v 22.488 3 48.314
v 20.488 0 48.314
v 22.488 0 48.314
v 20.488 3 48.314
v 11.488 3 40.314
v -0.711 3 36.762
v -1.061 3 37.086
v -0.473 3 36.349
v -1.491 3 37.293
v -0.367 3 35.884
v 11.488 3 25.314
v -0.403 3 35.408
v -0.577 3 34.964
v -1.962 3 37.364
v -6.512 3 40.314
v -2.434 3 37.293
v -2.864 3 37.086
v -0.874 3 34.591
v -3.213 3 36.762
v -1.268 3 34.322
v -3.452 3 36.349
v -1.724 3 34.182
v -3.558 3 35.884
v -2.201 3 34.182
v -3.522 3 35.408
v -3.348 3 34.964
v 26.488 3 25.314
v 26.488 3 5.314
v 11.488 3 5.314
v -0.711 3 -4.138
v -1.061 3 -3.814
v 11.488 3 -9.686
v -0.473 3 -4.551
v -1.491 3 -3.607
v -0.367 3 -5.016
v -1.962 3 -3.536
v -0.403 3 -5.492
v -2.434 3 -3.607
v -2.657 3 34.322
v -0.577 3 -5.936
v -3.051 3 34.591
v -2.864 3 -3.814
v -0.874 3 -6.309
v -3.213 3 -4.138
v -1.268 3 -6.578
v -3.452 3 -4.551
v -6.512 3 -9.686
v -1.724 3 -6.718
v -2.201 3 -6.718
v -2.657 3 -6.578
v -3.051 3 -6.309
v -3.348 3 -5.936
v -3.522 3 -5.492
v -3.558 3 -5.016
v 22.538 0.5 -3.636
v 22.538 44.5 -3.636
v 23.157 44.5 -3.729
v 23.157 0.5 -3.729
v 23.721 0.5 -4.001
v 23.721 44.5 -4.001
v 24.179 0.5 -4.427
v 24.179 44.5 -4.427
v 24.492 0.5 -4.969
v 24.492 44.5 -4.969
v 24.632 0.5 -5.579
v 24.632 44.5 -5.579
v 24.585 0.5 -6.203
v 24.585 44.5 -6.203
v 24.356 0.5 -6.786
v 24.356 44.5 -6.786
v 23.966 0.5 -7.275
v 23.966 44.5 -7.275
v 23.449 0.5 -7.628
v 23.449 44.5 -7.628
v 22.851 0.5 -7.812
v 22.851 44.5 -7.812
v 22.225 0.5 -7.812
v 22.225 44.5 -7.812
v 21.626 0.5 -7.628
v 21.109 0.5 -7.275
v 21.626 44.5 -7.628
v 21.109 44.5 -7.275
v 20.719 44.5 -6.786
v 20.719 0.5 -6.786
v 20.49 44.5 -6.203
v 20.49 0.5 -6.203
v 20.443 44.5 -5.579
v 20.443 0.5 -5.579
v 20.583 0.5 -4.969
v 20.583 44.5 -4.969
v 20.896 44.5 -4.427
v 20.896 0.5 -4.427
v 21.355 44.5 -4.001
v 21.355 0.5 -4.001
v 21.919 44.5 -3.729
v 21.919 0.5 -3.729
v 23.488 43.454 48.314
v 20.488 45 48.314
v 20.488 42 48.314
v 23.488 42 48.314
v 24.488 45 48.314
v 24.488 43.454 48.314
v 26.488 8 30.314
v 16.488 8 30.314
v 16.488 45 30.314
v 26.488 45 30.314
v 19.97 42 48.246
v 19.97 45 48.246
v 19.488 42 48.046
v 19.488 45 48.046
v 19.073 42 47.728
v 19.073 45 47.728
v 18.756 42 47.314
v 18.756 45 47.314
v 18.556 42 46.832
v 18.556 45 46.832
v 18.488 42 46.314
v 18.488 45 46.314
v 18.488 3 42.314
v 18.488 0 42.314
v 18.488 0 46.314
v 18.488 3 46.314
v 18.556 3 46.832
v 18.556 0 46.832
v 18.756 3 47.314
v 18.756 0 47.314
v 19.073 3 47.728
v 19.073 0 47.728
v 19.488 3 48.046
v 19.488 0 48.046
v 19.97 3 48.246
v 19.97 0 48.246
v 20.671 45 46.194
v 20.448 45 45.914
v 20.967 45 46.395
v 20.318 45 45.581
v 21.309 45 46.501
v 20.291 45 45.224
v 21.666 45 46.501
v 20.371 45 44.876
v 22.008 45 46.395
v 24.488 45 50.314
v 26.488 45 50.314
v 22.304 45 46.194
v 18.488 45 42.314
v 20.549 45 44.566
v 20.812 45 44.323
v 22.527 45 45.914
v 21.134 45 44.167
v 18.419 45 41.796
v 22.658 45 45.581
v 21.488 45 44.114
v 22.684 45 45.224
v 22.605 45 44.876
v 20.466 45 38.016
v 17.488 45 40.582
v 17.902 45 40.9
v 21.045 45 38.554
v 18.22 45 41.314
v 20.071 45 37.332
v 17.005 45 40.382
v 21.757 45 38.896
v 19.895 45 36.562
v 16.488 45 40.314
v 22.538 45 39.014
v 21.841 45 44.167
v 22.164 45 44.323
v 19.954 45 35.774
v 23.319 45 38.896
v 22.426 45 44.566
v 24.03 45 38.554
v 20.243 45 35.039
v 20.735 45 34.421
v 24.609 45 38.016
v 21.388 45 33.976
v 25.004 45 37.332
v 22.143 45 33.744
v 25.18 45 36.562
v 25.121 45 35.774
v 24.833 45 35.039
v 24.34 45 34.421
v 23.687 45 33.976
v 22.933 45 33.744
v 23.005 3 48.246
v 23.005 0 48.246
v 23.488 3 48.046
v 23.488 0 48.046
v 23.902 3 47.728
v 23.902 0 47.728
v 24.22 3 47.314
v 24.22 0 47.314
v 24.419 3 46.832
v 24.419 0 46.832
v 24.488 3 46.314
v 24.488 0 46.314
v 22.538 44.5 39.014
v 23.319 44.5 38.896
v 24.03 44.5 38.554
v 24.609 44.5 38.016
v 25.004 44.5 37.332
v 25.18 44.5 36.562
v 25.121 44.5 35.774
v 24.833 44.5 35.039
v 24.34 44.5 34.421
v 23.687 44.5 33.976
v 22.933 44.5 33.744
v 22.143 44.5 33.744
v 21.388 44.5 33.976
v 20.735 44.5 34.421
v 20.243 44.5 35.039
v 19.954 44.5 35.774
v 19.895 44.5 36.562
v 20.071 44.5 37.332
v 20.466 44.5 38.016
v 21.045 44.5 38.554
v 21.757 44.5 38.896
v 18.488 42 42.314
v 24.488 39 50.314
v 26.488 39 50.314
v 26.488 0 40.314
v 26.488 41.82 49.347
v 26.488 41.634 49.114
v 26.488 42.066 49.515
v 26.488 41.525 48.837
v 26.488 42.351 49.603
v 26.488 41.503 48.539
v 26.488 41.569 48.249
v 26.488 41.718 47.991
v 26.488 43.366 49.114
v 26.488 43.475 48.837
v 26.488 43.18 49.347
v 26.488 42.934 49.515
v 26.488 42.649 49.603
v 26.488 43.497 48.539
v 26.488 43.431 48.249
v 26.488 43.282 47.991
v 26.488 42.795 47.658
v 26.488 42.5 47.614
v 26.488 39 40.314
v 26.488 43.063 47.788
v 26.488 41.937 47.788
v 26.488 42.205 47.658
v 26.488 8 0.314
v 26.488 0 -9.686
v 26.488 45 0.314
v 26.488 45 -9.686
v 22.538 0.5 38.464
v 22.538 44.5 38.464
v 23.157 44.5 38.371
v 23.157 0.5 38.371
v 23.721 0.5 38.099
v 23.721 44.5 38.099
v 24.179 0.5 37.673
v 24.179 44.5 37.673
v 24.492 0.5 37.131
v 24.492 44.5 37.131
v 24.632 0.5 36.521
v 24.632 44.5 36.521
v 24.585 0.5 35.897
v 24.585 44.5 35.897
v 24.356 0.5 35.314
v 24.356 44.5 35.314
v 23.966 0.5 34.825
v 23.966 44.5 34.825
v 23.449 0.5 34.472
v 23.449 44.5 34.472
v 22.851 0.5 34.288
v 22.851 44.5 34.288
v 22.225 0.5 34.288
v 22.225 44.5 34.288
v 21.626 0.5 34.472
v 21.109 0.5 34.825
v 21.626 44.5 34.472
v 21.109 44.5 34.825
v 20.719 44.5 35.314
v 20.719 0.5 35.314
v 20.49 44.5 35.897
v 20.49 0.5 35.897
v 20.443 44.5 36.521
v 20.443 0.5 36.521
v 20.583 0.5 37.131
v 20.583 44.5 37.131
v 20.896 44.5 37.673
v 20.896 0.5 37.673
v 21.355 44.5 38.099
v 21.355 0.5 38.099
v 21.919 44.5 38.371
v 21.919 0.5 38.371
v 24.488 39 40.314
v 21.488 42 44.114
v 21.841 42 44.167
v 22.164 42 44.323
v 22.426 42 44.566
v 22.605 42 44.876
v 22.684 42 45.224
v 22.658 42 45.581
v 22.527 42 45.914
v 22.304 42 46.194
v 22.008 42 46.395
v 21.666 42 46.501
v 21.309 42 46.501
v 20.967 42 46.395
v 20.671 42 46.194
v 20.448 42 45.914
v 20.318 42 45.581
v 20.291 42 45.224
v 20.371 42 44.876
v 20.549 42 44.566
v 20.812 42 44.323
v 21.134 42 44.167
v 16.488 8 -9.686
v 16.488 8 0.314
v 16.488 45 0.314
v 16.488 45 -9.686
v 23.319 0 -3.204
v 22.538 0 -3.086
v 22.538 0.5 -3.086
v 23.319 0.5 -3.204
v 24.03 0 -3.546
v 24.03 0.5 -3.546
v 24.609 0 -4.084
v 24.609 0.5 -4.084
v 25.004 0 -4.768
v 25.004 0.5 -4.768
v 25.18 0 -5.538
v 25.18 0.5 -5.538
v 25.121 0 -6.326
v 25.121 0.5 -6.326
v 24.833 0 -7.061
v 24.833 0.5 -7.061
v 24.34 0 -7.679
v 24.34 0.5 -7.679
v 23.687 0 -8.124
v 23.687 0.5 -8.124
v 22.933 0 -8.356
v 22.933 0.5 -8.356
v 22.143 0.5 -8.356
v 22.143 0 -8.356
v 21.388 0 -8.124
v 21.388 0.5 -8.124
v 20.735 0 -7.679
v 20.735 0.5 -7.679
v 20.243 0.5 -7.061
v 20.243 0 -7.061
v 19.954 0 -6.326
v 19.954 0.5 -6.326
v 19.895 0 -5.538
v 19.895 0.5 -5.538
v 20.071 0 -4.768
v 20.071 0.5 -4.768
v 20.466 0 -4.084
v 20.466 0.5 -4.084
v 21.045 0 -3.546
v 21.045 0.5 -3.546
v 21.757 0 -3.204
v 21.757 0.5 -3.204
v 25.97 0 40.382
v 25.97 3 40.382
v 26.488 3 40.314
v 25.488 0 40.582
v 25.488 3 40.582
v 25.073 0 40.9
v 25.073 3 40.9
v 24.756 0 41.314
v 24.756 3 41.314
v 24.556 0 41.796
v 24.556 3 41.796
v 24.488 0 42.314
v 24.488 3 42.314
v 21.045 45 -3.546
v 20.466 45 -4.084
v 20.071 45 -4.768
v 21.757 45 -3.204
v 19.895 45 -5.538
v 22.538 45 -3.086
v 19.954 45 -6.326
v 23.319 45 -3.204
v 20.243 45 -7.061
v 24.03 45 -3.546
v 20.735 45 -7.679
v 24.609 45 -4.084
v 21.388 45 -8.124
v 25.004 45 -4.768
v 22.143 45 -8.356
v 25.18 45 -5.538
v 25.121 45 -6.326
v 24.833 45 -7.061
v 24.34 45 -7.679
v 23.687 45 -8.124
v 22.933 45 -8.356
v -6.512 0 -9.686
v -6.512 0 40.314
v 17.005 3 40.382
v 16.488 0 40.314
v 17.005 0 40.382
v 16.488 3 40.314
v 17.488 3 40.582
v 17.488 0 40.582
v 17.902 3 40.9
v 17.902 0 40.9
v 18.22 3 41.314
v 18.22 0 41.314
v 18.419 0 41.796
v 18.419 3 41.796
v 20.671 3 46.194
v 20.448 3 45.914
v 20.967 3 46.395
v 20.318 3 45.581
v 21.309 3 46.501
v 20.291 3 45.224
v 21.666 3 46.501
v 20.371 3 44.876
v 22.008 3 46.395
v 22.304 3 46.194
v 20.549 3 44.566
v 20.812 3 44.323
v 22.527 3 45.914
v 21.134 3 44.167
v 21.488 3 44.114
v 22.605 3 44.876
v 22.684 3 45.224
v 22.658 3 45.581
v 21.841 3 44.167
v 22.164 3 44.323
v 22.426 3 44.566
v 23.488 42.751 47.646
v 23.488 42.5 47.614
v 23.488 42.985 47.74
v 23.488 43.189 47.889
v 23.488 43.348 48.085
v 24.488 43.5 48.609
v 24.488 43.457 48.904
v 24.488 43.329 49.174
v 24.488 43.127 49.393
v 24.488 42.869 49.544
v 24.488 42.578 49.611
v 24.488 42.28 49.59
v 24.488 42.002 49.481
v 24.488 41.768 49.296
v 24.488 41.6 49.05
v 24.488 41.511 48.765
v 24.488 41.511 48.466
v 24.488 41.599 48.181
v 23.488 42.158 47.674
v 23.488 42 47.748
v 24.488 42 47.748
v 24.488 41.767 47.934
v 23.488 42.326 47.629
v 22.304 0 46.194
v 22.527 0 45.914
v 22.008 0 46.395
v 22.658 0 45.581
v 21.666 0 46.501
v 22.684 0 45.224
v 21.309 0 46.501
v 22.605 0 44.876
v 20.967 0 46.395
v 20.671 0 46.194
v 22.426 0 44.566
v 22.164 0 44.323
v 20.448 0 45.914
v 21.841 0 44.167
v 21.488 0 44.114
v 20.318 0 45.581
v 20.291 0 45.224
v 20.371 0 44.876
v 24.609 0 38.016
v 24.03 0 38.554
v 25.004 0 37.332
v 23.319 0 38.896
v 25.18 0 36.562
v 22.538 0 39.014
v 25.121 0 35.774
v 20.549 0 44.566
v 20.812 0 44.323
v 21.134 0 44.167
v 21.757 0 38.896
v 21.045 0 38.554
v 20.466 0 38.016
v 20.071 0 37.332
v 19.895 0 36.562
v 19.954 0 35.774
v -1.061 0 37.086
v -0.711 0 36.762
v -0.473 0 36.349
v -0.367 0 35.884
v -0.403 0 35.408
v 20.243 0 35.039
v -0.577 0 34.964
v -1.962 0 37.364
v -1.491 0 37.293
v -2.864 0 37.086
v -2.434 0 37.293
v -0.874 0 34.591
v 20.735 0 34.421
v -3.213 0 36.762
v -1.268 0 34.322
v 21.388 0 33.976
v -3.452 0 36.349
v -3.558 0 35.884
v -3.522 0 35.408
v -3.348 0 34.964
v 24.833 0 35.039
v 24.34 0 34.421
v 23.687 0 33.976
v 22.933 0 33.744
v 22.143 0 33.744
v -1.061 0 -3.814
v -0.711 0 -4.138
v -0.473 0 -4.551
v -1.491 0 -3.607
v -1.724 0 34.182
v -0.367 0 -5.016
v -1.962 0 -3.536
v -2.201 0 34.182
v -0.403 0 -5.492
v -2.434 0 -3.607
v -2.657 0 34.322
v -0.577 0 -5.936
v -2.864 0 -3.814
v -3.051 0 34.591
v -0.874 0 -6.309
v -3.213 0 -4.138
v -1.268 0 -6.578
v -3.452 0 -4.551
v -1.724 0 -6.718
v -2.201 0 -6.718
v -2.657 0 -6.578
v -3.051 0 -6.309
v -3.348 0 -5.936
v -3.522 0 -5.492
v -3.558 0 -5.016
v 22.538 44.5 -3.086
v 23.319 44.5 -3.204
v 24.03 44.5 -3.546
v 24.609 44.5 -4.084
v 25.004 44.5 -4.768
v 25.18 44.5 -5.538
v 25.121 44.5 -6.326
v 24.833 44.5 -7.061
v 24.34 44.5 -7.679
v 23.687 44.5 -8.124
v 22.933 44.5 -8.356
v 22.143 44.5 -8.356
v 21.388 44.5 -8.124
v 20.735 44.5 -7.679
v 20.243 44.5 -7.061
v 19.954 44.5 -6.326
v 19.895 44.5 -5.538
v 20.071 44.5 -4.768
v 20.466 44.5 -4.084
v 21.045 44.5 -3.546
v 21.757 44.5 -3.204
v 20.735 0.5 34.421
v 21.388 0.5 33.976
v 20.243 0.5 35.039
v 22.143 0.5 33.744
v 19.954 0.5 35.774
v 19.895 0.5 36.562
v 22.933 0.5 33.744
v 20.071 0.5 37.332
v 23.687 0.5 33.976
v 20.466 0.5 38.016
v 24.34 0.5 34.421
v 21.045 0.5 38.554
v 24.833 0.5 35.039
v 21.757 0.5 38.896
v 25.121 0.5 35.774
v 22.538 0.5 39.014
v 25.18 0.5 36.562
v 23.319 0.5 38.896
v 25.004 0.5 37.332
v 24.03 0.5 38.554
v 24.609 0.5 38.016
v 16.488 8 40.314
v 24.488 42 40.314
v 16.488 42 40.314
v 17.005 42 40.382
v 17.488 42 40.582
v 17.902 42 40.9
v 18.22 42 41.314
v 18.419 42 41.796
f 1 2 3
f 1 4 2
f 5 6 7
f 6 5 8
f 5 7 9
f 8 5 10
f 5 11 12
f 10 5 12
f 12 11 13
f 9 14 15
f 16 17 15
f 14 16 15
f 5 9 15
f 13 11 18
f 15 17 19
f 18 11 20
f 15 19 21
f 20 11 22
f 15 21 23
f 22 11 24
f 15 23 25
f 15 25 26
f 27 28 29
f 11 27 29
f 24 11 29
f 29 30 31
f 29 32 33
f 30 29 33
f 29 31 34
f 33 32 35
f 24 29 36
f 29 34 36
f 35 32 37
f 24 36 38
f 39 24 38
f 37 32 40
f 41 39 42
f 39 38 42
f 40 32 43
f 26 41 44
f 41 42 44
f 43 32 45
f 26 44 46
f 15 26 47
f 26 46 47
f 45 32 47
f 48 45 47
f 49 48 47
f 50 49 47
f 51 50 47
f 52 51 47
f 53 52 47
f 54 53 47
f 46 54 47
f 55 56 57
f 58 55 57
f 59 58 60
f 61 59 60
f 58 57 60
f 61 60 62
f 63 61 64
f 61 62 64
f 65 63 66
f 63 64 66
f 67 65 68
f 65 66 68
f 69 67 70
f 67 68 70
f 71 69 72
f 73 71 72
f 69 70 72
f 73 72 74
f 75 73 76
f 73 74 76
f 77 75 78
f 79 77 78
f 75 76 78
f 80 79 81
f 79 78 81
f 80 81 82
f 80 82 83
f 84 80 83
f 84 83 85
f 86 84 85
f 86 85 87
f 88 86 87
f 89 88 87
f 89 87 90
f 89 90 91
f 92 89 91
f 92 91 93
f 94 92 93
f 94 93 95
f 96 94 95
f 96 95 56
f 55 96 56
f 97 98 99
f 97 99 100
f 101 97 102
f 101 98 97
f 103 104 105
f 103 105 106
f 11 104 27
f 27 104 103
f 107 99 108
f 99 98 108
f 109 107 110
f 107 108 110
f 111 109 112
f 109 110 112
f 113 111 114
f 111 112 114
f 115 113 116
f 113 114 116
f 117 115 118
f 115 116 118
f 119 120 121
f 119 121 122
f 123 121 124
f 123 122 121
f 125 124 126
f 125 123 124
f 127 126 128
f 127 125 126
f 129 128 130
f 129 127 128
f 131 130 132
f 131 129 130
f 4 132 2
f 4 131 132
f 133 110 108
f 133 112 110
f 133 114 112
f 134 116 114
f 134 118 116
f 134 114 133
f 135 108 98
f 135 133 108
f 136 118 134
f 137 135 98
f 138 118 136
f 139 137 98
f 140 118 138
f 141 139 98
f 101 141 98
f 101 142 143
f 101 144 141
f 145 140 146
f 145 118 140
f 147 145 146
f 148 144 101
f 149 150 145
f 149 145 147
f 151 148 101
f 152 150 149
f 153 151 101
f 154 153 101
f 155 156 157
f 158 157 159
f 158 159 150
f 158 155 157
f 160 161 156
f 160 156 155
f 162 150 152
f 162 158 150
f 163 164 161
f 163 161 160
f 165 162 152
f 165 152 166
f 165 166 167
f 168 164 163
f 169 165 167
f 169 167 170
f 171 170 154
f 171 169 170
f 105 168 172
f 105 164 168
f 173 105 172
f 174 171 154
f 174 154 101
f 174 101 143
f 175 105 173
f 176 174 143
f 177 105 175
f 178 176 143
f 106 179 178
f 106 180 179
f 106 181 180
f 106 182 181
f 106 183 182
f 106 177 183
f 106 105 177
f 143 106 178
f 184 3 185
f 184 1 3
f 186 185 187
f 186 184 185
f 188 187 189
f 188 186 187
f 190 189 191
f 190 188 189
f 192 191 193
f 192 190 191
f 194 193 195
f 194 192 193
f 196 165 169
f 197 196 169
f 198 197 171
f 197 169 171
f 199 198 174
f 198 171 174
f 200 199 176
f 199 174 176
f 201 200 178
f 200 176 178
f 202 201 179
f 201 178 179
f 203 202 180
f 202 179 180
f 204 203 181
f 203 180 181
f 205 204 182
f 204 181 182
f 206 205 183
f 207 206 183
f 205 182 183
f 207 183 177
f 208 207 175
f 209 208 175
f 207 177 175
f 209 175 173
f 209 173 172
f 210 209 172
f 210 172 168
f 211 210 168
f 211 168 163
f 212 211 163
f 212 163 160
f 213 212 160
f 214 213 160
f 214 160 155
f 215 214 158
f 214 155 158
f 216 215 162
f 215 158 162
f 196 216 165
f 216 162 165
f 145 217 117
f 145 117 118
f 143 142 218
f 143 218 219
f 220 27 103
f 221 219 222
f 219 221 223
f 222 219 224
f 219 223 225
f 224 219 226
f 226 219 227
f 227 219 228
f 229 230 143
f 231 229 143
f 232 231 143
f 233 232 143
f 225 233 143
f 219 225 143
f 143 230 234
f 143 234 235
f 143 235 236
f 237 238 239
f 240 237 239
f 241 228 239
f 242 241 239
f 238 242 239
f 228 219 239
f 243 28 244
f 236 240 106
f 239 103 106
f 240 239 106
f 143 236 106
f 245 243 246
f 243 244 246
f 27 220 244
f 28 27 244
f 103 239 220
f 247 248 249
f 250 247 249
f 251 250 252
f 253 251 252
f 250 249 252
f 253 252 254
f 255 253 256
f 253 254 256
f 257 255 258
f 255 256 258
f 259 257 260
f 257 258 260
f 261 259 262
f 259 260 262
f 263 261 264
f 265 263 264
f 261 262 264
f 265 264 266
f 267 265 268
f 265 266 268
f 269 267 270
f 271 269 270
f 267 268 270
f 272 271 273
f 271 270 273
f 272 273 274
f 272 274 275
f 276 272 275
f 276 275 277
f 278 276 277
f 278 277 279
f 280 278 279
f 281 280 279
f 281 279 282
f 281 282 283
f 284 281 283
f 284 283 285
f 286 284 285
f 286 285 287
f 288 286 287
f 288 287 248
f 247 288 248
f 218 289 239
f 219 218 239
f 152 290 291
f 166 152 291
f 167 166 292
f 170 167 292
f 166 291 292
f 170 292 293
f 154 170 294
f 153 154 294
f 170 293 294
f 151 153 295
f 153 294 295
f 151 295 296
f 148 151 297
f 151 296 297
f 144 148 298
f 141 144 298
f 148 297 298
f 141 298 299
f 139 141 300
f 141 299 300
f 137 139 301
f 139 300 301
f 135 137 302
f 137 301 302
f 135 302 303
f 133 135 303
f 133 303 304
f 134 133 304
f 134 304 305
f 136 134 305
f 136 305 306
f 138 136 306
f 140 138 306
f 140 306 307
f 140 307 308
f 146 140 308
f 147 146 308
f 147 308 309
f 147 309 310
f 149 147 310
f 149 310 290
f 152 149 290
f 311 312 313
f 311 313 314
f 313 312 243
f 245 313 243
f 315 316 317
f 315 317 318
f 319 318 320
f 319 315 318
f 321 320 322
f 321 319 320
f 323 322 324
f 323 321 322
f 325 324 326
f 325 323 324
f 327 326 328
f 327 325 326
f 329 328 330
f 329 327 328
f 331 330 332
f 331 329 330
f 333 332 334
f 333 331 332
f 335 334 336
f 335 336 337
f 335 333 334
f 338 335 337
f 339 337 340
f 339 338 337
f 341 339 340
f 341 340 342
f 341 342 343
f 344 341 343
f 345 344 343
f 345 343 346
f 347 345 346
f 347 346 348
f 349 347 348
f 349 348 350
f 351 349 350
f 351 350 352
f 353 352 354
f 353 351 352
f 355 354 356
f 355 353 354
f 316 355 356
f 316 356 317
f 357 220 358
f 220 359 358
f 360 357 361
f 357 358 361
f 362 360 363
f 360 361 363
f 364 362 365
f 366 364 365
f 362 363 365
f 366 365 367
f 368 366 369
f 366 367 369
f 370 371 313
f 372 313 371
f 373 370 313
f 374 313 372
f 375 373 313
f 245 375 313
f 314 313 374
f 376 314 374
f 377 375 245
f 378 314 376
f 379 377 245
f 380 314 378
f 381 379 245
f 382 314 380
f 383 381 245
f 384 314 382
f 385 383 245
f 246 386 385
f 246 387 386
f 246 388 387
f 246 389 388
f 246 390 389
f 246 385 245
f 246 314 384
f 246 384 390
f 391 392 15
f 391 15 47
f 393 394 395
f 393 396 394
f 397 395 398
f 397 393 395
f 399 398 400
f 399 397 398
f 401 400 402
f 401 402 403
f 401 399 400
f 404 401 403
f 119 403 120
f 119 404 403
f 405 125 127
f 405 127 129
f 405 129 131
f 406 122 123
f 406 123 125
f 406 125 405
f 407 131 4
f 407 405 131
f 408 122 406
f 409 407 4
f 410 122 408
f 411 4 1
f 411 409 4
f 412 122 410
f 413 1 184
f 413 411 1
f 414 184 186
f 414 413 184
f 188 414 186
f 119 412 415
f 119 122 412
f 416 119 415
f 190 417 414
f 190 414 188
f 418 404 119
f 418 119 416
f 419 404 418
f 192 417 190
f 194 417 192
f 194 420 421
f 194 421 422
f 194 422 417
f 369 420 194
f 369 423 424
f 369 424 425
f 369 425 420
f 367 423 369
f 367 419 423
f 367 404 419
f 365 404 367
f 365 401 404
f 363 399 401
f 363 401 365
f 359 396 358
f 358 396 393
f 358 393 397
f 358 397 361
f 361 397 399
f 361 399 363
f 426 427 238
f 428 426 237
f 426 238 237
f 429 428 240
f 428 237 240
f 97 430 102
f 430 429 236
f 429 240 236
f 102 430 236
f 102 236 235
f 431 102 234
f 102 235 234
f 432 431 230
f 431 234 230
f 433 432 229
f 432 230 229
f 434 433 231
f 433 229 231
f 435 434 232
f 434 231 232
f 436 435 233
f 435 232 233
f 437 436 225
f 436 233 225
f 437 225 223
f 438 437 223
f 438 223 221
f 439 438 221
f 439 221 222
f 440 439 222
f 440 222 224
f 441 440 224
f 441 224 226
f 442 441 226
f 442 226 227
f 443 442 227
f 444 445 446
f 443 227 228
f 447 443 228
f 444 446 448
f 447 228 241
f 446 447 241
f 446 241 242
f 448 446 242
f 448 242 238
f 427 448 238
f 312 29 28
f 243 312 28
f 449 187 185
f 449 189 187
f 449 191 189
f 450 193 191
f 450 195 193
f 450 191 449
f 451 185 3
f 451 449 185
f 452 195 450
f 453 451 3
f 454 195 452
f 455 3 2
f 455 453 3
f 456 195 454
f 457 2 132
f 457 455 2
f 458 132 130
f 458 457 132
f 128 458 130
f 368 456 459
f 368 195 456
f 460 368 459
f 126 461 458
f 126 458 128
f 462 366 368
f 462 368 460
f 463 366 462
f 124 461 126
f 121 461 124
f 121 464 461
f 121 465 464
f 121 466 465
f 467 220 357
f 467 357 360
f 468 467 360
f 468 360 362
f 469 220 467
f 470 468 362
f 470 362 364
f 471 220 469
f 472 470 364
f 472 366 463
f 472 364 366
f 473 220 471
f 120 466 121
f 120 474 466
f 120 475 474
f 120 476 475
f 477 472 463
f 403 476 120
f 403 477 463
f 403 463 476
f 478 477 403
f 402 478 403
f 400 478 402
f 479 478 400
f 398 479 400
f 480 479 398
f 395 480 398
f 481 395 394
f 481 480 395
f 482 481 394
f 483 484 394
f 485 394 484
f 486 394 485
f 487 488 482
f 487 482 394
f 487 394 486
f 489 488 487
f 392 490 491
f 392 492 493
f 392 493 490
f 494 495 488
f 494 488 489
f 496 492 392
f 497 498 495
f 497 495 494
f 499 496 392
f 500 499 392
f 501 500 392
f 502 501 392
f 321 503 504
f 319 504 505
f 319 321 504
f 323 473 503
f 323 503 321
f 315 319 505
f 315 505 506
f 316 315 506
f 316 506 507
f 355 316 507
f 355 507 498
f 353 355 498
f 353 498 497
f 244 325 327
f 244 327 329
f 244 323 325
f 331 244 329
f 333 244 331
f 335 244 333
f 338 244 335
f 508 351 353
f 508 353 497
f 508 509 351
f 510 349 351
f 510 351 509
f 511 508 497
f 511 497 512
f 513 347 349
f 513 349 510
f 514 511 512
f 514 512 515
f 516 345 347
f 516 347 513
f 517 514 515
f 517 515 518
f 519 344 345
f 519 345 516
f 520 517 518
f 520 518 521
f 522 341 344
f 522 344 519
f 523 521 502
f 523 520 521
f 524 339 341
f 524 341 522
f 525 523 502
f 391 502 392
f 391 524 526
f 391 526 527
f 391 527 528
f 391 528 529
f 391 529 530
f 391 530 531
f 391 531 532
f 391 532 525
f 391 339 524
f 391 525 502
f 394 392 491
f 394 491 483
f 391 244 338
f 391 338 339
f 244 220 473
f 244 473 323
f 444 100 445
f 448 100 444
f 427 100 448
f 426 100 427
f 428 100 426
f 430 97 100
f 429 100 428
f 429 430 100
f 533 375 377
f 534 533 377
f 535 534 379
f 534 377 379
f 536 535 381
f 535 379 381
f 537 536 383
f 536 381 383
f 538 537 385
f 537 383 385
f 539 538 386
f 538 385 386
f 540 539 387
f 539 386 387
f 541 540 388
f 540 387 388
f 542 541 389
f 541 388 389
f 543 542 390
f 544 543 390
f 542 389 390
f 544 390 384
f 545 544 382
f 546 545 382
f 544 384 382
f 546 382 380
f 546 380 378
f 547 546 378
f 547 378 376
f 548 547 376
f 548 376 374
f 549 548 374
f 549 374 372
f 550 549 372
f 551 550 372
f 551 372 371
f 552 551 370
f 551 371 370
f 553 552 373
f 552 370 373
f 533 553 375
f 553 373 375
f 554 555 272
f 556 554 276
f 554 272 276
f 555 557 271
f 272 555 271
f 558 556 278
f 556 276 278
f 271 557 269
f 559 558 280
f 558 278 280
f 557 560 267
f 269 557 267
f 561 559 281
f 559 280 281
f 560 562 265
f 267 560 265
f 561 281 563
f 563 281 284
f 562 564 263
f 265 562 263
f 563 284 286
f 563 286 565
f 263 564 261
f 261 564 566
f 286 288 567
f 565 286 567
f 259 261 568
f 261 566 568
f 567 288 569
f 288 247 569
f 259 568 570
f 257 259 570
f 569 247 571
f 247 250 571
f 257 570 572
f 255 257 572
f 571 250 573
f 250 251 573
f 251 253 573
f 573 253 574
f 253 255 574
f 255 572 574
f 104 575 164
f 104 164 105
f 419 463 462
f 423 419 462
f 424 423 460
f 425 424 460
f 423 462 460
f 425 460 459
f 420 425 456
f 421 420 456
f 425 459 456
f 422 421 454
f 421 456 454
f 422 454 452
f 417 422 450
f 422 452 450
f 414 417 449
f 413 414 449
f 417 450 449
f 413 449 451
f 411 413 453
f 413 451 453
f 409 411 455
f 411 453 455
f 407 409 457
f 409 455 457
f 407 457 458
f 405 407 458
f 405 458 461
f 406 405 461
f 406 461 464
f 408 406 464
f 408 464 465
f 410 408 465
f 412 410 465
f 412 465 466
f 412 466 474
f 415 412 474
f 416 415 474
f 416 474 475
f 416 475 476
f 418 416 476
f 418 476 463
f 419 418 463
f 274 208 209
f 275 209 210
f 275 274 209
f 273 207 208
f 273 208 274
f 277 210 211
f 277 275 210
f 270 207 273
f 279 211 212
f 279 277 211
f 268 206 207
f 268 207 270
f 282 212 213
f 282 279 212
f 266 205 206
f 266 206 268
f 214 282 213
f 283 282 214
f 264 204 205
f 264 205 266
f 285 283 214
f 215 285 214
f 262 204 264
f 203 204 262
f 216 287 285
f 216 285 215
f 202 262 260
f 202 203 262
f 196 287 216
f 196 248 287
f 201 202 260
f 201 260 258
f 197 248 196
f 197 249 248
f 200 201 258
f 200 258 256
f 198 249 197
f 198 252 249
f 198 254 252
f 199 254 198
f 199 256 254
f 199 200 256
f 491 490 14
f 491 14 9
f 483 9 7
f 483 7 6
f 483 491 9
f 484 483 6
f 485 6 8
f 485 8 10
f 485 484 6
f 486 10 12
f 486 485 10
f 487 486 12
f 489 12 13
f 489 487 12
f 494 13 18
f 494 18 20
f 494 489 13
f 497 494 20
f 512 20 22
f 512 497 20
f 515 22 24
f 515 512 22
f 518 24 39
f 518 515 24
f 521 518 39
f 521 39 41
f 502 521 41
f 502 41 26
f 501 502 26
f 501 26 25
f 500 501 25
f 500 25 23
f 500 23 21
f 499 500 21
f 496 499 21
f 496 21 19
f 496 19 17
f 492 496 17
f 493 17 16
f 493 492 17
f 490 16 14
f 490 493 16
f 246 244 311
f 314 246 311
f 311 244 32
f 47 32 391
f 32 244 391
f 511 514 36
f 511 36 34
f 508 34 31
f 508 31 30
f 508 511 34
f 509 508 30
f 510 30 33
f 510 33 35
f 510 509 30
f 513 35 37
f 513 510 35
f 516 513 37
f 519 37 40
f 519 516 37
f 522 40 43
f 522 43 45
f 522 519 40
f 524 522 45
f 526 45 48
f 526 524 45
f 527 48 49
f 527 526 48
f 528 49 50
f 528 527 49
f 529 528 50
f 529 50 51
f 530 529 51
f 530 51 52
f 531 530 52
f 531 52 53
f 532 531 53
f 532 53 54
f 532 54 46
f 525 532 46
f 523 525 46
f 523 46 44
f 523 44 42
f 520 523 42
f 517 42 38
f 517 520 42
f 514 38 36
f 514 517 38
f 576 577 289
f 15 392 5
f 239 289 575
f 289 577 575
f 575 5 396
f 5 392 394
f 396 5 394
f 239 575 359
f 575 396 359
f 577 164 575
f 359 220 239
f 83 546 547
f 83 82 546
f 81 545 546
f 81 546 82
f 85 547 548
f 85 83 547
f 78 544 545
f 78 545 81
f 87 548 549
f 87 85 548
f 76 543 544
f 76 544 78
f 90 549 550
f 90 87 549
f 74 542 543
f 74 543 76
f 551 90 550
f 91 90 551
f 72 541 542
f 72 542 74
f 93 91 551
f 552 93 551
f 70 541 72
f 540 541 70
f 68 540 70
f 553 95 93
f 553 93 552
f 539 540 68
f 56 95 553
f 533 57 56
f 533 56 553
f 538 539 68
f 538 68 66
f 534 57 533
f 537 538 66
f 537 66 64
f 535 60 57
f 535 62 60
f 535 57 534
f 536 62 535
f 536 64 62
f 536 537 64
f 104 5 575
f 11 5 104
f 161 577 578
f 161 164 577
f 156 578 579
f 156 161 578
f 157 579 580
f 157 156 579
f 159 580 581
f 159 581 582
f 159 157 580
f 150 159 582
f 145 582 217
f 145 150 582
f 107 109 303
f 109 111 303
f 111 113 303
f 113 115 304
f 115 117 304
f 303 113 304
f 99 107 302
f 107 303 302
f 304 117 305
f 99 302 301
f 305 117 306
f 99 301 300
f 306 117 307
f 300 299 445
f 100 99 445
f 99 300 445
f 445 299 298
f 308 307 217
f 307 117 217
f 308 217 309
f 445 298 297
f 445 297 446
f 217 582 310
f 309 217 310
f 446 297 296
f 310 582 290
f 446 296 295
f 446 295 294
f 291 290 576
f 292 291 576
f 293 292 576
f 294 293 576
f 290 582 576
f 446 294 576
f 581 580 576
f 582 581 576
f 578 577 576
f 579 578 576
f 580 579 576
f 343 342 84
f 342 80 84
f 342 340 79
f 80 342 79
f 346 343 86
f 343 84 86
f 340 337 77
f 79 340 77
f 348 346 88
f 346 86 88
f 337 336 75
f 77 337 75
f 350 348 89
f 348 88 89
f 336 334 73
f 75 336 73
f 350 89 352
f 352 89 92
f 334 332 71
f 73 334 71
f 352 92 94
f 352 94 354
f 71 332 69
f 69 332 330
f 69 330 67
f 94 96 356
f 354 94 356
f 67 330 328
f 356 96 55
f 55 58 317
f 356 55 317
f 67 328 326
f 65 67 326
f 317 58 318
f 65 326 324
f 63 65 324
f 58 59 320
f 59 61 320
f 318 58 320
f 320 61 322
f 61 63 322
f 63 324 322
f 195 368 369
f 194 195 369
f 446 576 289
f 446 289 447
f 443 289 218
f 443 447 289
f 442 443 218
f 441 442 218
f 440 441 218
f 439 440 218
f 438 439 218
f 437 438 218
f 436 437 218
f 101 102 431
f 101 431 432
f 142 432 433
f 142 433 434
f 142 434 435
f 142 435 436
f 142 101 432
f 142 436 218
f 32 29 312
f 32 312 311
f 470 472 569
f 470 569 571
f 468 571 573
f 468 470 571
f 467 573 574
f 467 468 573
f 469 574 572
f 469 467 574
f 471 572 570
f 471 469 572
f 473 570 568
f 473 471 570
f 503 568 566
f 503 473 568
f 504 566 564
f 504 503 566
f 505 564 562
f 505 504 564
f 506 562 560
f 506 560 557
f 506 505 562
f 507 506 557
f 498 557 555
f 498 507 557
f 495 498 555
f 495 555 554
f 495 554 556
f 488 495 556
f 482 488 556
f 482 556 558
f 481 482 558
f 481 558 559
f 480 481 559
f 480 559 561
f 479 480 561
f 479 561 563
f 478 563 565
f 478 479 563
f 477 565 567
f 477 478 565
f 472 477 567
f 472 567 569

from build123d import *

# Parameters (mm, degrees)
SKETCH1_R           = 1.6
BOSS_EXTRUDE1_DEPTH = 3
SKETCH2_W           = 10
SKETCH2_H           = 10
BOSS_EXTRUDE2_DEPTH = 42
CHAMFER1_SIZE       = 5
SKETCH3_R           = 2.1
CUT_EXTRUDE1_DEPTH  = 52
SKETCH4_R           = 2.65
CUT_EXTRUDE2_DEPTH  = 0.5
SKETCH11_W          = 6
SKETCH11_H          = 3
BOSS_EXTRUDE7_DEPTH = 8
SKETCH12_R          = 1.2
CUT_EXTRUDE5_DEPTH  = 72.139584736
FILLET1_R           = 2
SKETCH13_W          = 2
SKETCH13_H          = 3
BOSS_EXTRUDE8_DEPTH = 10
SKETCH14_W          = 2
SKETCH14_H          = 10
BOSS_EXTRUDE9_DEPTH = 3
SKETCH15_R          = 1
CUT_EXTRUDE6_DEPTH  = 3


with BuildPart() as part:
    # Sketch1 → Boss-Extrude1 (new body)
    with BuildSketch(Plane(origin=(0, 0, 0), x_dir=(1, 0, 0), z_dir=(0, 1, 0))):
        Polygon((-6.512396694, 9.685950413), (1.487603306, 9.685950413), (26.487603306, 9.685950413), (26.487603306, -40.314049587), (1.487603306, -40.314049587), (-6.512396694, -40.314049587), align=None)
        with Locations(Location((-1.962396694, -35.764049587, 0), (0, 0, 270))):
            Circle(SKETCH1_R, mode=Mode.SUBTRACT)
        with Locations(Location((-1.962396694, 5.135950413, 0), (0, 0, 270))):
            Circle(SKETCH1_R, mode=Mode.SUBTRACT)
    extrude(amount=BOSS_EXTRUDE1_DEPTH)

    # Sketch2 → Boss-Extrude2 (add)
    with BuildSketch(Plane(origin=(0, 3, 0), x_dir=(1, 0, 0), z_dir=(0, 1, 0))):
        with Locations((21.487603306, -35.314049587)):
            Rectangle(SKETCH2_W, SKETCH2_H)
        with Locations((21.487603306, 4.685950413)):
            Rectangle(SKETCH2_W, SKETCH2_H)
    extrude(amount=BOSS_EXTRUDE2_DEPTH)

    # Chamfer1
    chamfer1_edges = [part.edges().sort_by_distance(p)[0] for p in [
        (21.487603306, 3, 30.314049587),
        (16.487603306, 3, 35.314049587),
        (16.487603306, 3, -4.685950413),
        (21.487603306, 3, 0.314049587),
    ]]
    chamfer(chamfer1_edges, length=CHAMFER1_SIZE)

    # Sketch3 → Cut-Extrude1 (cut)
    with BuildSketch(Plane(origin=(0, 45, 0), x_dir=(1, 0, 0), z_dir=(0, 1, 0))):
        with Locations(Location((22.537603306, -36.364049587, 0), (0, 0, 270))):
            Circle(SKETCH3_R)
        with Locations(Location((22.537603306, 5.735950413, 0), (0, 0, 270))):
            Circle(SKETCH3_R)
    extrude(amount=-CUT_EXTRUDE1_DEPTH, mode=Mode.SUBTRACT)

    # Sketch4 → Cut-Extrude2 (cut)
    with BuildSketch(Plane(origin=(0, 45, 0), x_dir=(1, 0, 0), z_dir=(0, 1, 0))):
        with Locations(Location((22.537603306, -36.364049587, 0), (0, 0, 270))):
            Circle(SKETCH4_R)
        with Locations(Location((22.537603306, 5.735950413, 0), (0, 0, 270))):
            Circle(SKETCH4_R)
    cut_extrude2 = extrude(amount=-CUT_EXTRUDE2_DEPTH, mode=Mode.SUBTRACT)

    # Mirror1: Cut-Extrude2 across plane
    add(cut_extrude2.mirror(Plane(origin=(0, 22.5, 0), x_dir=(0, 0, 1), z_dir=(0, -1, 0))), mode=Mode.SUBTRACT)

    # Sketch11 → Boss-Extrude7 (add)
    with BuildSketch(Plane.XY.offset(40.314049587)):
        with Locations((21.487603306, 43.5)):
            Rectangle(SKETCH11_W, SKETCH11_H)
        with Locations((21.487603306, 1.5)):
            Rectangle(SKETCH11_W, SKETCH11_H)
    extrude(amount=BOSS_EXTRUDE7_DEPTH)

    # Sketch12 → Cut-Extrude5 (cut, through all)
    with BuildSketch(Plane.XZ):
        with Locations(Location((21.487603306, 45.314049587, 0), (0, 0, 270))):
            Circle(SKETCH12_R)
    extrude(amount=-CUT_EXTRUDE5_DEPTH, mode=Mode.SUBTRACT)

    # Fillet1
    fillet1_edges = [part.edges().sort_by_distance(p)[0] for p in [
        (18.487603306, 43.5, 40.314049587),
        (18.487603306, 1.5, 40.314049587),
        (24.487603306, 1.5, 40.314049587),
    ]]
    fillet(fillet1_edges, radius=FILLET1_R - 0.0001)  # a hair under: the kernel refuses the full size
    fillet1_2_edges = [part.edges().sort_by_distance(p)[0] for p in [
        (18.487603306, 43.5, 48.314049587),
        (24.487603306, 1.5, 48.314049587),
        (18.487603306, 1.5, 48.314049587),
    ]]
    fillet(fillet1_2_edges, radius=FILLET1_R)

    # Sketch13 → Boss-Extrude8 (add)
    with BuildSketch(Plane.XY.offset(40.314049587)):
        with Locations((25.487603306, 43.5)):
            Rectangle(SKETCH13_W, SKETCH13_H)
    extrude(amount=BOSS_EXTRUDE8_DEPTH)

    # Sketch14 → Boss-Extrude9 (add)
    with BuildSketch(Plane.XZ.offset(-42)):
        with Locations((25.487603306, 45.314049587)):
            Rectangle(SKETCH14_W, SKETCH14_H)
    extrude(amount=BOSS_EXTRUDE9_DEPTH)

    # Sketch15 → Cut-Extrude6 (cut)
    with BuildSketch(Plane(origin=(26.487603306, 0, 0), x_dir=(0, 0, -1), z_dir=(1, 0, 0))):
        with Locations((-48.614049587, 42.5)):
            Circle(SKETCH15_R)
    extrude(amount=-CUT_EXTRUDE6_DEPTH, mode=Mode.SUBTRACT)


solid = part.part
